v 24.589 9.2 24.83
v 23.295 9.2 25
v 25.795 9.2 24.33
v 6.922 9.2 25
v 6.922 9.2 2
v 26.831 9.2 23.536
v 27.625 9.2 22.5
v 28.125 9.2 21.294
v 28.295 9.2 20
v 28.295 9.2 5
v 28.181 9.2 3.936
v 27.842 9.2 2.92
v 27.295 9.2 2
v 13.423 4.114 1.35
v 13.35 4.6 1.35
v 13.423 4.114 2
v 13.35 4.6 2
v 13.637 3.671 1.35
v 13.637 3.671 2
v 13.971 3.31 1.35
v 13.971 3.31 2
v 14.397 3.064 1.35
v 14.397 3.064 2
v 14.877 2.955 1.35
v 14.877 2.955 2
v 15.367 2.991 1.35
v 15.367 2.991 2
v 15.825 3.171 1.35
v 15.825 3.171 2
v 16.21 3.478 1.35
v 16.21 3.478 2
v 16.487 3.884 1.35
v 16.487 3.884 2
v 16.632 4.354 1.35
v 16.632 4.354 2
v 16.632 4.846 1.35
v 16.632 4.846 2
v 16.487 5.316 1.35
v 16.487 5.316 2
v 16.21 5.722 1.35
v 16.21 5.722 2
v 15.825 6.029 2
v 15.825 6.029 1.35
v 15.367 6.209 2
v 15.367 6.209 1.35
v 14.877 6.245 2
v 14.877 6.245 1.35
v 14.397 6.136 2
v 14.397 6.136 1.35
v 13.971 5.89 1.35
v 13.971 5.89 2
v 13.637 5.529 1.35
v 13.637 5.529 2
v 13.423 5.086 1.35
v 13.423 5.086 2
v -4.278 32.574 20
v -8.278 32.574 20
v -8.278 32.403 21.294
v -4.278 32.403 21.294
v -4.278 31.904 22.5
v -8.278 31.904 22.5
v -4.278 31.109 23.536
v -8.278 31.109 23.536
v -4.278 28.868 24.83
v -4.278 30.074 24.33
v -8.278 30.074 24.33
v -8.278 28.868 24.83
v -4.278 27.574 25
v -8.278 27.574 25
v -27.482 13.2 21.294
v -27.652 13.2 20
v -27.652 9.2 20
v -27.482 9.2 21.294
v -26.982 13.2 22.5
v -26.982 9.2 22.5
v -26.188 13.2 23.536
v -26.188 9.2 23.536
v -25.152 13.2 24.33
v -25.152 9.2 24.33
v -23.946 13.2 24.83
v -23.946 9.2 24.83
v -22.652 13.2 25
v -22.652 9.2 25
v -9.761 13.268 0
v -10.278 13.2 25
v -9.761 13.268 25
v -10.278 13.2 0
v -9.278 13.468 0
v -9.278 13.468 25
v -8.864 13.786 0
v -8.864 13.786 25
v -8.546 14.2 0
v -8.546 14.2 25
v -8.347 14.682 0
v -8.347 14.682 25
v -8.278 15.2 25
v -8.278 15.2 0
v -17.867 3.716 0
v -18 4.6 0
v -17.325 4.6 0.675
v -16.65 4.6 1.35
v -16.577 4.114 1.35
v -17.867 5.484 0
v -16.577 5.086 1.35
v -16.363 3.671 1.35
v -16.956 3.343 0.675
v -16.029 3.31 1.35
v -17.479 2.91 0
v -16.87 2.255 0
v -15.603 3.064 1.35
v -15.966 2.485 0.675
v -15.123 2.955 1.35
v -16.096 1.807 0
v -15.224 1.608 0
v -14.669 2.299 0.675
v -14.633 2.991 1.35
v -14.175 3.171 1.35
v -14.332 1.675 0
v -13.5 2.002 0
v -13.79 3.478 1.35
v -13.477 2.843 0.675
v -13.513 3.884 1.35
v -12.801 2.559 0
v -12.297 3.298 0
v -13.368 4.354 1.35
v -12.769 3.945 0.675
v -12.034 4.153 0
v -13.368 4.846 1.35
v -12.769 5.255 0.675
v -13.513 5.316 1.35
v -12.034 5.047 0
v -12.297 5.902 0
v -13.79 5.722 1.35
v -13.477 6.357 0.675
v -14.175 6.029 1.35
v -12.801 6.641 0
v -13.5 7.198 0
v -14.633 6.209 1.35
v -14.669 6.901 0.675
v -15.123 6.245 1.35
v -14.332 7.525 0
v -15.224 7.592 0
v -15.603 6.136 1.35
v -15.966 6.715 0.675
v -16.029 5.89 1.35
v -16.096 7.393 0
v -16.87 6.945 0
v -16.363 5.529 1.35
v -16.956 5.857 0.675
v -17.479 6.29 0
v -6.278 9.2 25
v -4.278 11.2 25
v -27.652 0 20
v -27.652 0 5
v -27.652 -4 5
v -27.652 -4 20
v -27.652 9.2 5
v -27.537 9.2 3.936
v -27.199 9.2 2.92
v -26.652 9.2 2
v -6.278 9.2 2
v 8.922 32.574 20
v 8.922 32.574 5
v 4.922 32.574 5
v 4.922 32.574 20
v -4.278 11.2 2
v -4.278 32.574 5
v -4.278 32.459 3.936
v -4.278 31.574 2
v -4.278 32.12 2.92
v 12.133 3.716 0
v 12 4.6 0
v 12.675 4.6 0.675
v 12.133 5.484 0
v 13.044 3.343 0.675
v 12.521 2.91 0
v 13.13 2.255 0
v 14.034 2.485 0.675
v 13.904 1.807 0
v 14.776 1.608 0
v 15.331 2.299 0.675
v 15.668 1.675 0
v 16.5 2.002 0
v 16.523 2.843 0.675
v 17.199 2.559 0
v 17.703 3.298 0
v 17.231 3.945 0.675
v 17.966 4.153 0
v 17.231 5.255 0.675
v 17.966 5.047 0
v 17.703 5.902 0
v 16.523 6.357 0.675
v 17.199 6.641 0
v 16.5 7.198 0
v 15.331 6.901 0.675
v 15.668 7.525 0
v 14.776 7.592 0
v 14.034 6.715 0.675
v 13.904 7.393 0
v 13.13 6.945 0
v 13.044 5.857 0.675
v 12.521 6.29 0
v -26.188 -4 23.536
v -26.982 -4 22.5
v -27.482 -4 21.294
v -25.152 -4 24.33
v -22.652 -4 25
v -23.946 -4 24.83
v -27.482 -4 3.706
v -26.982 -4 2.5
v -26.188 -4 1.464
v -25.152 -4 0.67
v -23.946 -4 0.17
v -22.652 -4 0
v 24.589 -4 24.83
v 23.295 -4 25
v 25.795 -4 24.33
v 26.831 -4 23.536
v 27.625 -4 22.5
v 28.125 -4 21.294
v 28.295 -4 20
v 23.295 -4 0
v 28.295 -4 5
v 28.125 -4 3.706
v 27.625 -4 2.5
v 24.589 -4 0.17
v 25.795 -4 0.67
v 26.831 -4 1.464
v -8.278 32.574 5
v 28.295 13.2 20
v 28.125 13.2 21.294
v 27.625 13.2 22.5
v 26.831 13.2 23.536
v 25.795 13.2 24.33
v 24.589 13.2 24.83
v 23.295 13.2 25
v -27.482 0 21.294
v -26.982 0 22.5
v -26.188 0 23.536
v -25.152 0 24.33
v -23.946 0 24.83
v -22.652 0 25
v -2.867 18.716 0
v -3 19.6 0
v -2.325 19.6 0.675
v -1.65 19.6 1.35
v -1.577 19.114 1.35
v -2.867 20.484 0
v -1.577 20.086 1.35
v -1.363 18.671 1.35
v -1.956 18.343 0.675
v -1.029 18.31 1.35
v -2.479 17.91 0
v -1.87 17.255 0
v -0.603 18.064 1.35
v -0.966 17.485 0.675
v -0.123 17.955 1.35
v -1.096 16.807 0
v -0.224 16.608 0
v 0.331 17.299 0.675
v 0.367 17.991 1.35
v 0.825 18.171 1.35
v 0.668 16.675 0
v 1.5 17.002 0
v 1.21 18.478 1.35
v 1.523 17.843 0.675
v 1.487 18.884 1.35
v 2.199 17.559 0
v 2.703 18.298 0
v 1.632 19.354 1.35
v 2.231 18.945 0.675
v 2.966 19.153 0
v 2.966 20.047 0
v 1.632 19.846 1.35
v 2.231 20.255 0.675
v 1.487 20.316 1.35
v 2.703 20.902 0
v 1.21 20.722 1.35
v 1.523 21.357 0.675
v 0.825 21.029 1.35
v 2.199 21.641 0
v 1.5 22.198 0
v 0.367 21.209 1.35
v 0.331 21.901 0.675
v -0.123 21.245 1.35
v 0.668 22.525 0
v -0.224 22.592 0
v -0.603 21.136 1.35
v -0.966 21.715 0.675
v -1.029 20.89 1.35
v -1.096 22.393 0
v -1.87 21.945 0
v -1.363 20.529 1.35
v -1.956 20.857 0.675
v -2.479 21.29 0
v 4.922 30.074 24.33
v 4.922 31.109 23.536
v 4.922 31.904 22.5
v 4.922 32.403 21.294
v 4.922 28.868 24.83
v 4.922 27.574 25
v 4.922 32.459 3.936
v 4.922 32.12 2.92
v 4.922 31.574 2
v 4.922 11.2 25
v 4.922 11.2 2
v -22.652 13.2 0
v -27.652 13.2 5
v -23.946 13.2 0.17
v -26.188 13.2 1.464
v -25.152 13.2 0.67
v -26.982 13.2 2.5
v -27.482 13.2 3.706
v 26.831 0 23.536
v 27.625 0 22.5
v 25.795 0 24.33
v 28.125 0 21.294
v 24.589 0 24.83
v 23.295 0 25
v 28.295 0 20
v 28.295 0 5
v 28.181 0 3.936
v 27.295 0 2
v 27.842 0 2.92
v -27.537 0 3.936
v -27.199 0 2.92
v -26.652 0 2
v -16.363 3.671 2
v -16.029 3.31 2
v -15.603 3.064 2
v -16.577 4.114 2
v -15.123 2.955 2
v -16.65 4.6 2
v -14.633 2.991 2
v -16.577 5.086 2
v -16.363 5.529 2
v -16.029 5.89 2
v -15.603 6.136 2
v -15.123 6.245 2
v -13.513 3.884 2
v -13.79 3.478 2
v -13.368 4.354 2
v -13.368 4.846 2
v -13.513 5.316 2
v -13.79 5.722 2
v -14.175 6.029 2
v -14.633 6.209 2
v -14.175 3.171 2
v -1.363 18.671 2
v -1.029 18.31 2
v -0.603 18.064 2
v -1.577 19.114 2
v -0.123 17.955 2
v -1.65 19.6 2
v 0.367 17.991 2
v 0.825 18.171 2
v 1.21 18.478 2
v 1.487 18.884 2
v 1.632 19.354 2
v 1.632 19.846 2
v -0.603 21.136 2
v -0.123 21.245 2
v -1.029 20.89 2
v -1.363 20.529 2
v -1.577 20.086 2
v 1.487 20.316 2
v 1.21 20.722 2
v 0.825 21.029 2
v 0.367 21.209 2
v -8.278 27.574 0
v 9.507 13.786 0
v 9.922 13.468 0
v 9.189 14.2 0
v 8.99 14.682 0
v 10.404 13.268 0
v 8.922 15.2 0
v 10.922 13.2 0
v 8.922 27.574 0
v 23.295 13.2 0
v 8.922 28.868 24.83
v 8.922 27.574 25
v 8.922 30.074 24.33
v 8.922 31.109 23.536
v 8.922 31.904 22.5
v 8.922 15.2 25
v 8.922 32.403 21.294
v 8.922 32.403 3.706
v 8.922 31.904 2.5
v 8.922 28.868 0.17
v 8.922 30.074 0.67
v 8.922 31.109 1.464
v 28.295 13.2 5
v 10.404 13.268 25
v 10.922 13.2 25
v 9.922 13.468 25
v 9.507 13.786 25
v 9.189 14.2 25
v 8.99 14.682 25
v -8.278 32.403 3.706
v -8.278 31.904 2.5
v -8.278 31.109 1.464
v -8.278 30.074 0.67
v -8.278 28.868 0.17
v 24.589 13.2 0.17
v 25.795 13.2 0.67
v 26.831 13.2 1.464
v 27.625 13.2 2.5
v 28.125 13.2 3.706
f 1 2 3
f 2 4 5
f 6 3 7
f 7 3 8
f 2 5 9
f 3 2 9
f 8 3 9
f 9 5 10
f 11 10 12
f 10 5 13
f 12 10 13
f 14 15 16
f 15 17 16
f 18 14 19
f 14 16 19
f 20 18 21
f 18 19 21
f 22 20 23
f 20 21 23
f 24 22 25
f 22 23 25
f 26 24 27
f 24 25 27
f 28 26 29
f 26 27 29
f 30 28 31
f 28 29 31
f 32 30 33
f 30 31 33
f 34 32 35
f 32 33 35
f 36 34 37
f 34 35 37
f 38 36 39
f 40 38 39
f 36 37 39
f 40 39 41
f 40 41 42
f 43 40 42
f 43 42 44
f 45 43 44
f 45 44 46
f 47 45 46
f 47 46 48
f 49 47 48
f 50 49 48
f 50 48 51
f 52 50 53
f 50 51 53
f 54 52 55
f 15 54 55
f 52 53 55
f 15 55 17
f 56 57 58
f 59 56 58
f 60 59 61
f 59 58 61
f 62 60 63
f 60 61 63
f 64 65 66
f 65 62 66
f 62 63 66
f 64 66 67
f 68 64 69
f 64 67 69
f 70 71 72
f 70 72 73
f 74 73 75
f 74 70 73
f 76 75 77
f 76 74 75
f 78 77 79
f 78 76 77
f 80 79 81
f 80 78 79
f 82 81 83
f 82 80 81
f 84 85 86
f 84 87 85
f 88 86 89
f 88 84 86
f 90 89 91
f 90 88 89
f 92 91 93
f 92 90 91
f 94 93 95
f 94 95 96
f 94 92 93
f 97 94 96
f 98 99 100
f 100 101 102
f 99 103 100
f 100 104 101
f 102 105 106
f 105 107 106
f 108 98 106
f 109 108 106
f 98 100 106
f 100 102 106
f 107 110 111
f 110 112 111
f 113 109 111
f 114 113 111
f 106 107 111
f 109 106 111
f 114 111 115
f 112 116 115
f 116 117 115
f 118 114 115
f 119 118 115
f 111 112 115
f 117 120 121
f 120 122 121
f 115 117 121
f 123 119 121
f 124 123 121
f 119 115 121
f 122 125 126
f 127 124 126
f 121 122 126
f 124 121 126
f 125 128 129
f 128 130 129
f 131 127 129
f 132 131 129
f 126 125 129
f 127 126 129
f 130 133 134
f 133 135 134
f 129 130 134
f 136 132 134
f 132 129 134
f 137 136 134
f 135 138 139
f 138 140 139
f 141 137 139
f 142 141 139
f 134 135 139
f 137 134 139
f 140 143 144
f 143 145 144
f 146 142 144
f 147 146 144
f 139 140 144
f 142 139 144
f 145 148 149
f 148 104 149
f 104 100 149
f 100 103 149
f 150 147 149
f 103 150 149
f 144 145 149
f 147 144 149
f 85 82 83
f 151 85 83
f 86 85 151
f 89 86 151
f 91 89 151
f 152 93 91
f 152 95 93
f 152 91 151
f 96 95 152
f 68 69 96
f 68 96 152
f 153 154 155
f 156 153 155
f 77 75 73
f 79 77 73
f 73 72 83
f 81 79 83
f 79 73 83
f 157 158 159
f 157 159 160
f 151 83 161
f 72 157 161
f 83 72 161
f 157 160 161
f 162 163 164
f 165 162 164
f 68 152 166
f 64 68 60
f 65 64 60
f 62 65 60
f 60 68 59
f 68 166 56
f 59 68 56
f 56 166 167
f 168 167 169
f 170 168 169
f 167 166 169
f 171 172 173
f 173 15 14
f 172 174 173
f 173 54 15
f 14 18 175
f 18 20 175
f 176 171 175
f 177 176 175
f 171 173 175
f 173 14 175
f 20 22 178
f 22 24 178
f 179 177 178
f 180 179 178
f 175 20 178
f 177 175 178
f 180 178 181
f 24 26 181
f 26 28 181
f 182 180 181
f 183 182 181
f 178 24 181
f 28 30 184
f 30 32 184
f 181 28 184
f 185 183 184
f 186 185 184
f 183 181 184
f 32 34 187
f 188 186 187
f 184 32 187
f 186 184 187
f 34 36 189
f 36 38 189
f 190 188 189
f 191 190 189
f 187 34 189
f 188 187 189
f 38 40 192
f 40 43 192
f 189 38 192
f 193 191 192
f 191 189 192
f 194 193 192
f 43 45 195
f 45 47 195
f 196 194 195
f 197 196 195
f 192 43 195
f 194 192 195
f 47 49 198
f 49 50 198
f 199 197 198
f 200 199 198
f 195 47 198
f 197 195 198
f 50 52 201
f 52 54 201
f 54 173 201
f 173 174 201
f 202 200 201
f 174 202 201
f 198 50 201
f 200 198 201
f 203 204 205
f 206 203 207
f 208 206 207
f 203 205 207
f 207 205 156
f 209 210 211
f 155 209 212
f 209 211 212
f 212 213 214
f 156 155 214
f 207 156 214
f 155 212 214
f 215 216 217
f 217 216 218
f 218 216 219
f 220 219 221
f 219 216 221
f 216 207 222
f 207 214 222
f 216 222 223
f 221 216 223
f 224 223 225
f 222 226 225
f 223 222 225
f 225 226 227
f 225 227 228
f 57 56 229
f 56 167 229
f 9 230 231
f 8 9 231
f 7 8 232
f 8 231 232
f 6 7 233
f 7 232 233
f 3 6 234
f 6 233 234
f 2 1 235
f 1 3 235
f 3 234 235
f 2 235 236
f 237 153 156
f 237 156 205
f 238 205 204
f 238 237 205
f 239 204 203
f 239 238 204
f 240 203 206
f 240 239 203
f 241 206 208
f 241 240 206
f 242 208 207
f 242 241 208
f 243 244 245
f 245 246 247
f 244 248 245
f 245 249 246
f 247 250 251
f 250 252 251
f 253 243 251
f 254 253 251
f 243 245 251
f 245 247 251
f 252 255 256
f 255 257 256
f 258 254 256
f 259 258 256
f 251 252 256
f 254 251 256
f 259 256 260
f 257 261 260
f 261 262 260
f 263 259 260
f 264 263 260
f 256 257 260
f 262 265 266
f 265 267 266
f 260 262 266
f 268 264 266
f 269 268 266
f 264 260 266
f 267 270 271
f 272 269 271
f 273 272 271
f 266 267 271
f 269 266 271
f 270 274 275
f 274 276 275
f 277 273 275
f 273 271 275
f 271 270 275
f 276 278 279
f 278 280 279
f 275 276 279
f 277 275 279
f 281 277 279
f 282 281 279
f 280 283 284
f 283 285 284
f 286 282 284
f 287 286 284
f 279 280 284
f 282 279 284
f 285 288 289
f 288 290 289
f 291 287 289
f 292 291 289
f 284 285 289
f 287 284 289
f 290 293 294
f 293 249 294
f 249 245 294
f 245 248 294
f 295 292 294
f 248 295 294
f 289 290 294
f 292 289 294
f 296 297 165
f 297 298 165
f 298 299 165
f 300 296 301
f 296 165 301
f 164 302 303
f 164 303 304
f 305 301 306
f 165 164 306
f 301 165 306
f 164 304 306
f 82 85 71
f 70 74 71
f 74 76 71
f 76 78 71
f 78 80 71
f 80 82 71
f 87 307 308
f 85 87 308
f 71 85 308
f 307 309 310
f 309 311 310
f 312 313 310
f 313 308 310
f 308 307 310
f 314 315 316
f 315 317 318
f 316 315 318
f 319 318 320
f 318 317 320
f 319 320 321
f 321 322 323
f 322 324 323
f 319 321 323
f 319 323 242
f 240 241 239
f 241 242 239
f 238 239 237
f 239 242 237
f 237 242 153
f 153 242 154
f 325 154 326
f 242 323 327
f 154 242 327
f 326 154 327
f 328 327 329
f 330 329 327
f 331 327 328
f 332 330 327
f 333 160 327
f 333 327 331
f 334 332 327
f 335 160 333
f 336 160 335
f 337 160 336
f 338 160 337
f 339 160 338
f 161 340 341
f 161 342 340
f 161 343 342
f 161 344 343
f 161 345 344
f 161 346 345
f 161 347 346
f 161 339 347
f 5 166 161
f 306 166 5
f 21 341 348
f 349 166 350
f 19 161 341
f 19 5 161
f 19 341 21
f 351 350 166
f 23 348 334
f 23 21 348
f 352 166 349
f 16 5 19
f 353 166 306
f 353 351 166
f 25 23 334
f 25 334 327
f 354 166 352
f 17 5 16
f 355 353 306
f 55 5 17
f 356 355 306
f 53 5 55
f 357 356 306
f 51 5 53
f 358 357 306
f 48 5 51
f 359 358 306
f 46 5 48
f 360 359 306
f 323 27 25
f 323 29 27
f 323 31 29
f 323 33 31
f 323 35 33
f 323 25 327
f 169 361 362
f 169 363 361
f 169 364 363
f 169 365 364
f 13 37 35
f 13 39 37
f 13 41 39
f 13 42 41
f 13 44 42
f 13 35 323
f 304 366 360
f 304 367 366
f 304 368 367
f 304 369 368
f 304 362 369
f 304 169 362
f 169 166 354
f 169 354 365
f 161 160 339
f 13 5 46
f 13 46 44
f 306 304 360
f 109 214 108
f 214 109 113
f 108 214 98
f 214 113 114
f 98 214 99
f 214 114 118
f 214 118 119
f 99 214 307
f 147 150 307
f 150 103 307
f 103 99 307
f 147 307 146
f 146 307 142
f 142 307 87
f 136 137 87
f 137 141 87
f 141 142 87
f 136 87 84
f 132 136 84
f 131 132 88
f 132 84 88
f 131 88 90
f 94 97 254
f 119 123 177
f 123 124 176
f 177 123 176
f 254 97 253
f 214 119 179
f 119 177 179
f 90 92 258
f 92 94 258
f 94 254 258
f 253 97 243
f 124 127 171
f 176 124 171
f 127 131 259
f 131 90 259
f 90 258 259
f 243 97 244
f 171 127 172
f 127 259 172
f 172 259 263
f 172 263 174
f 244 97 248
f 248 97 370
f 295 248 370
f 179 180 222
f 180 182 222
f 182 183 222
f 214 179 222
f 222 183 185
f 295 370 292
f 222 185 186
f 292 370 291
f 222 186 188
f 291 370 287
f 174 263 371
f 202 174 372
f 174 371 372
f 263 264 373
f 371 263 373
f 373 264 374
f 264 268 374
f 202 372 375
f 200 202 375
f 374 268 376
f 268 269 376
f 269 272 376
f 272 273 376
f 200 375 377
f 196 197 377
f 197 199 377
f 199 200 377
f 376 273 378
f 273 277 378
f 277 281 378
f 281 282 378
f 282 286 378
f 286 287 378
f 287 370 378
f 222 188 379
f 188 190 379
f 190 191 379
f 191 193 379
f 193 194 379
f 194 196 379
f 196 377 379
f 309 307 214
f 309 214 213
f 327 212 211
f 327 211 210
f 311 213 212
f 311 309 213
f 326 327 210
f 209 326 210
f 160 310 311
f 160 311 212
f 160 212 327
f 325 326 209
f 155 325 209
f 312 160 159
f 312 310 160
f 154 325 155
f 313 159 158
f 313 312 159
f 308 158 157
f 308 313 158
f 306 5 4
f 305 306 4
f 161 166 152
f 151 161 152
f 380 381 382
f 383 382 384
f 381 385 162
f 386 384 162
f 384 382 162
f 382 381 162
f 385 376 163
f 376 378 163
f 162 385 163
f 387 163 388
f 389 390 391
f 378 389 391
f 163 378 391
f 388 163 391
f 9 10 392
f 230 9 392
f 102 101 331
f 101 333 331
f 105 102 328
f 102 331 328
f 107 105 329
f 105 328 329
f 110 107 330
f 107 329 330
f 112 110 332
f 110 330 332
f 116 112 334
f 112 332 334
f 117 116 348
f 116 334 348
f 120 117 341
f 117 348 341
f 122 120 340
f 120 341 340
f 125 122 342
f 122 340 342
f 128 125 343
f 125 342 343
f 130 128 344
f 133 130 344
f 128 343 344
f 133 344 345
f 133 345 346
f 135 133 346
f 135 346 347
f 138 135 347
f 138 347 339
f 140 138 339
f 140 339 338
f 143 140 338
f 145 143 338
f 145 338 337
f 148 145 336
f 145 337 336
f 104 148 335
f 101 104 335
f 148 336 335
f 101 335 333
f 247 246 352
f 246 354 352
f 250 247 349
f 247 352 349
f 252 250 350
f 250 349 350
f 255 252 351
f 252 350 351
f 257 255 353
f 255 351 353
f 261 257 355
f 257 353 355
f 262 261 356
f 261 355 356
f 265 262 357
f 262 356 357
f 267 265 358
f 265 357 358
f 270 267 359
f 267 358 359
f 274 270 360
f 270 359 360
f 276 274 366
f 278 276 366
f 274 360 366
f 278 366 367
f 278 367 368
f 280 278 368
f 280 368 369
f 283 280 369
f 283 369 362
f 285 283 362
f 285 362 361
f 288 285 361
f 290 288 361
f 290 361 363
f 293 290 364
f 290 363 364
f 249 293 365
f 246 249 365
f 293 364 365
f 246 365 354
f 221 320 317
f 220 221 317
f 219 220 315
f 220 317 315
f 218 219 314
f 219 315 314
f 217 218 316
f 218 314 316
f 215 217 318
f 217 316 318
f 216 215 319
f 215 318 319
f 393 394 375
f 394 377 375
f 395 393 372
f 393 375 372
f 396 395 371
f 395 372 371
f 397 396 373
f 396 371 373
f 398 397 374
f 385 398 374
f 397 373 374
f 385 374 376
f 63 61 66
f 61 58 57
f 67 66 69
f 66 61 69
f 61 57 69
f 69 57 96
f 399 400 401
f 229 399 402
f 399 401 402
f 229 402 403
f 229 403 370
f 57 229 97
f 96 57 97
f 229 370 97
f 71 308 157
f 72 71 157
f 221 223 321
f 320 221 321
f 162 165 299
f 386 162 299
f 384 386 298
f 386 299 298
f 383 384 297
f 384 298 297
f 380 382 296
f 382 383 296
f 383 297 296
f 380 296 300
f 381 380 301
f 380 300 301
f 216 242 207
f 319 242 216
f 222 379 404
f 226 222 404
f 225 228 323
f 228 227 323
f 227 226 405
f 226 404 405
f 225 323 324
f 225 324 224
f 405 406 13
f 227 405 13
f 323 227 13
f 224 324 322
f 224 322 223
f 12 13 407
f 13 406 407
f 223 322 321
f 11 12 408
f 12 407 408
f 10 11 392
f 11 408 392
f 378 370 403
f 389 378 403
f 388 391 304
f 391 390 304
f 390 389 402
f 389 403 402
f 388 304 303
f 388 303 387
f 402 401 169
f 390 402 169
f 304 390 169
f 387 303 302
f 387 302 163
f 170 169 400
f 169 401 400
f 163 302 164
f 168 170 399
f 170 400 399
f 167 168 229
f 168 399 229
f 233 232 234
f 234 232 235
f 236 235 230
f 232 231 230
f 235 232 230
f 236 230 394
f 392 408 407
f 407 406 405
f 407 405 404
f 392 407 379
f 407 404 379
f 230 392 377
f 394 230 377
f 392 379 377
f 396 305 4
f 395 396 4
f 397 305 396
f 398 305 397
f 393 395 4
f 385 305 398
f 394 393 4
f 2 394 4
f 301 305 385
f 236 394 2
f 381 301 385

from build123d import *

# Parameters (mm, degrees)
F1_DEPTH       = 2
F2_DEPTH       = 25
F3_R           = 2
F4_T1_DEPTH    = 29
F4_T3_DEPTH    = 29
F4_T5_DEPTH    = 29
F4_T7_DEPTH    = 29
F4_T9_DEPTH    = 42.2
F4_T11_DEPTH   = 42.2
F5_R           = 2
F6_SIZE        = 2
F8_D           = 3.3
F8_CSINK_D     = 6
F8_CSINK_ANGLE = 90


# Not quite as in the source:
# - a fillet or chamfer that OpenCascade refuses, or shapes differently, is made with other operations: its cross-section is extruded or revolved along the edge and cut away or added


with BuildPart() as f1:
    # F0 (on Top) → F1 (new body)
    with BuildSketch(Plane.XY):
        Polygon((-27.6520505063, 0), (0, 0), (28.2951036699, 0), (28.2951036699, 9.2), (4.9215265818, 9.2), (4.9215265818, 32.5735770881), (-4.2784734182, 32.5735770881), (-4.2784734182, 9.2), (-27.6520505063, 9.2), align=None)
        Polygon((28.2951036699, 0), (0, 0), (-27.6520505063, 0), (-27.6520505063, -4), (0, -4), (28.2951036699, -4), align=None)
        Polygon((4.9215265818, 9.2), (28.2951036699, 9.2), (28.2951036699, 13.2), (8.9215265818, 13.2), (8.9215265818, 32.5735770881), (4.9215265818, 32.5735770881), align=None)
        Polygon((-27.6520505063, 13.2), (-27.6520505063, 9.2), (-4.2784734182, 9.2), (-4.2784734182, 32.5735770881), (-8.2784734182, 32.5735770881), (-8.2784734182, 13.2), align=None)
    extrude(amount=F1_DEPTH)

    # F0 (on Top) → F2 (join)
    with BuildSketch(Plane.XY):
        Polygon((-27.6520505063, 13.2), (-27.6520505063, 9.2), (-4.2784734182, 9.2), (-4.2784734182, 32.5735770881), (-8.2784734182, 32.5735770881), (-8.2784734182, 13.2), align=None)
        Polygon((4.9215265818, 9.2), (28.2951036699, 9.2), (28.2951036699, 13.2), (8.9215265818, 13.2), (8.9215265818, 32.5735770881), (4.9215265818, 32.5735770881), align=None)
        Polygon((28.2951036699, 0), (0, 0), (-27.6520505063, 0), (-27.6520505063, -4), (0, -4), (28.2951036699, -4), align=None)
    extrude(amount=F2_DEPTH)

    # F3
    f3_edges = [f1.edges().sort_by_distance(p)[0] for p in [
        (8.921527, 13.2, 12.5),
    ]]
    fillet(f3_edges, radius=F3_R)

    # F4: fillet of radius 5 on 9 edges, made by hand

    # F4_s2 → F4_t1 (cut)
    with BuildSketch(Plane.XZ.offset(-12.5)):
        with BuildLine():
            ThreePointArc((28.2951036699, 20), (26.8306375758, 23.5355339059), (23.2951036699, 25))
            Line((23.2951036699, 25), (28.2951036699, 25))
            Line((28.2951036699, 25), (28.2951036699, 20))
        make_face()
        with BuildLine():
            ThreePointArc((-27.6520505063, 20), (-26.1875844123, 23.5355339059), (-22.6520505063, 25))
            Line((-22.6520505063, 25), (-27.6520505063, 25))
            Line((-27.6520505063, 25), (-27.6520505063, 20))
        make_face()
    extrude(amount=F4_T1_DEPTH, mode=Mode.SUBTRACT)

    # F4_s4 → F4_t3 (cut)
    with BuildSketch(Plane.XZ.offset(-25.7)):
        with BuildLine():
            ThreePointArc((28.2951036699, 20), (26.8306375758, 23.5355339059), (23.2951036699, 25))
            Line((23.2951036699, 25), (28.2951036699, 25))
            Line((28.2951036699, 25), (28.2951036699, 20))
        make_face()
        with BuildLine():
            ThreePointArc((-27.6520505063, 20), (-26.1875844123, 23.5355339059), (-22.6520505063, 25))
            Line((-22.6520505063, 25), (-27.6520505063, 25))
            Line((-27.6520505063, 25), (-27.6520505063, 20))
        make_face()
    extrude(amount=F4_T3_DEPTH, mode=Mode.SUBTRACT)

    # F4_s6 → F4_t5 (cut)
    with BuildSketch(Plane.YZ.offset(-20.7784734182)):
        with BuildLine():
            ThreePointArc((32.5735770881, 20), (31.1091109941, 23.5355339059), (27.5735770881, 25))
            Line((27.5735770881, 25), (32.5735770881, 25))
            Line((32.5735770881, 25), (32.5735770881, 20))
        make_face()
    extrude(amount=F4_T5_DEPTH, mode=Mode.SUBTRACT)

    # F4_s8 → F4_t7 (cut)
    with BuildSketch(Plane.YZ.offset(-7.5784734182)):
        with BuildLine():
            ThreePointArc((32.5735770881, 20), (31.1091109941, 23.5355339059), (27.5735770881, 25))
            Line((27.5735770881, 25), (32.5735770881, 25))
            Line((32.5735770881, 25), (32.5735770881, 20))
        make_face()
    extrude(amount=F4_T7_DEPTH, mode=Mode.SUBTRACT)

    # F4_s10 → F4_t9 (cut)
    with BuildSketch(Plane.XZ.offset(-25.7)):
        with BuildLine():
            ThreePointArc((-22.6520505063, 0), (-26.1875844123, 1.4644660941), (-27.6520505063, 5))
            Line((-27.6520505063, 5), (-27.6520505063, 0))
            Line((-27.6520505063, 0), (-22.6520505063, 0))
        make_face()
        with BuildLine():
            ThreePointArc((23.2951036699, 0), (26.8306375758, 1.4644660941), (28.2951036699, 5))
            Line((28.2951036699, 5), (28.2951036699, 0))
            Line((28.2951036699, 0), (23.2951036699, 0))
        make_face()
    extrude(amount=F4_T9_DEPTH, mode=Mode.SUBTRACT)

    # F4_s12 → F4_t11 (cut)
    with BuildSketch(Plane.YZ.offset(-20.7784734182)):
        with BuildLine():
            ThreePointArc((27.5735770881, 0), (31.1091109941, 1.4644660941), (32.5735770881, 5))
            Line((32.5735770881, 5), (32.5735770881, 0))
            Line((32.5735770881, 0), (27.5735770881, 0))
        make_face()
    extrude(amount=F4_T11_DEPTH, mode=Mode.SUBTRACT)

    # F5
    f5_edges = [f1.edges().sort_by_distance(p)[0] for p in [
        (-8.278473, 13.2, 12.5),
    ]]
    fillet(f5_edges, radius=F5_R)

    # F6
    f6_edges = [f1.edges().sort_by_distance(p)[0] for p in [
        (4.921527, 9.2, 13.5),
        (-4.278473, 9.2, 13.5),
    ]]
    chamfer(f6_edges, length=F6_SIZE)

    # F8 (through all)
    with Locations(Plane(origin=(0, 0, 0), x_dir=(1, 0, 0), z_dir=(0, 0, -1))):
        with Locations((-15, -4.6), (0, -19.6), (15, -4.6)):
            CounterSinkHole(F8_D / 2, F8_CSINK_D / 2, counter_sink_angle=F8_CSINK_ANGLE)


solid = f1.part
